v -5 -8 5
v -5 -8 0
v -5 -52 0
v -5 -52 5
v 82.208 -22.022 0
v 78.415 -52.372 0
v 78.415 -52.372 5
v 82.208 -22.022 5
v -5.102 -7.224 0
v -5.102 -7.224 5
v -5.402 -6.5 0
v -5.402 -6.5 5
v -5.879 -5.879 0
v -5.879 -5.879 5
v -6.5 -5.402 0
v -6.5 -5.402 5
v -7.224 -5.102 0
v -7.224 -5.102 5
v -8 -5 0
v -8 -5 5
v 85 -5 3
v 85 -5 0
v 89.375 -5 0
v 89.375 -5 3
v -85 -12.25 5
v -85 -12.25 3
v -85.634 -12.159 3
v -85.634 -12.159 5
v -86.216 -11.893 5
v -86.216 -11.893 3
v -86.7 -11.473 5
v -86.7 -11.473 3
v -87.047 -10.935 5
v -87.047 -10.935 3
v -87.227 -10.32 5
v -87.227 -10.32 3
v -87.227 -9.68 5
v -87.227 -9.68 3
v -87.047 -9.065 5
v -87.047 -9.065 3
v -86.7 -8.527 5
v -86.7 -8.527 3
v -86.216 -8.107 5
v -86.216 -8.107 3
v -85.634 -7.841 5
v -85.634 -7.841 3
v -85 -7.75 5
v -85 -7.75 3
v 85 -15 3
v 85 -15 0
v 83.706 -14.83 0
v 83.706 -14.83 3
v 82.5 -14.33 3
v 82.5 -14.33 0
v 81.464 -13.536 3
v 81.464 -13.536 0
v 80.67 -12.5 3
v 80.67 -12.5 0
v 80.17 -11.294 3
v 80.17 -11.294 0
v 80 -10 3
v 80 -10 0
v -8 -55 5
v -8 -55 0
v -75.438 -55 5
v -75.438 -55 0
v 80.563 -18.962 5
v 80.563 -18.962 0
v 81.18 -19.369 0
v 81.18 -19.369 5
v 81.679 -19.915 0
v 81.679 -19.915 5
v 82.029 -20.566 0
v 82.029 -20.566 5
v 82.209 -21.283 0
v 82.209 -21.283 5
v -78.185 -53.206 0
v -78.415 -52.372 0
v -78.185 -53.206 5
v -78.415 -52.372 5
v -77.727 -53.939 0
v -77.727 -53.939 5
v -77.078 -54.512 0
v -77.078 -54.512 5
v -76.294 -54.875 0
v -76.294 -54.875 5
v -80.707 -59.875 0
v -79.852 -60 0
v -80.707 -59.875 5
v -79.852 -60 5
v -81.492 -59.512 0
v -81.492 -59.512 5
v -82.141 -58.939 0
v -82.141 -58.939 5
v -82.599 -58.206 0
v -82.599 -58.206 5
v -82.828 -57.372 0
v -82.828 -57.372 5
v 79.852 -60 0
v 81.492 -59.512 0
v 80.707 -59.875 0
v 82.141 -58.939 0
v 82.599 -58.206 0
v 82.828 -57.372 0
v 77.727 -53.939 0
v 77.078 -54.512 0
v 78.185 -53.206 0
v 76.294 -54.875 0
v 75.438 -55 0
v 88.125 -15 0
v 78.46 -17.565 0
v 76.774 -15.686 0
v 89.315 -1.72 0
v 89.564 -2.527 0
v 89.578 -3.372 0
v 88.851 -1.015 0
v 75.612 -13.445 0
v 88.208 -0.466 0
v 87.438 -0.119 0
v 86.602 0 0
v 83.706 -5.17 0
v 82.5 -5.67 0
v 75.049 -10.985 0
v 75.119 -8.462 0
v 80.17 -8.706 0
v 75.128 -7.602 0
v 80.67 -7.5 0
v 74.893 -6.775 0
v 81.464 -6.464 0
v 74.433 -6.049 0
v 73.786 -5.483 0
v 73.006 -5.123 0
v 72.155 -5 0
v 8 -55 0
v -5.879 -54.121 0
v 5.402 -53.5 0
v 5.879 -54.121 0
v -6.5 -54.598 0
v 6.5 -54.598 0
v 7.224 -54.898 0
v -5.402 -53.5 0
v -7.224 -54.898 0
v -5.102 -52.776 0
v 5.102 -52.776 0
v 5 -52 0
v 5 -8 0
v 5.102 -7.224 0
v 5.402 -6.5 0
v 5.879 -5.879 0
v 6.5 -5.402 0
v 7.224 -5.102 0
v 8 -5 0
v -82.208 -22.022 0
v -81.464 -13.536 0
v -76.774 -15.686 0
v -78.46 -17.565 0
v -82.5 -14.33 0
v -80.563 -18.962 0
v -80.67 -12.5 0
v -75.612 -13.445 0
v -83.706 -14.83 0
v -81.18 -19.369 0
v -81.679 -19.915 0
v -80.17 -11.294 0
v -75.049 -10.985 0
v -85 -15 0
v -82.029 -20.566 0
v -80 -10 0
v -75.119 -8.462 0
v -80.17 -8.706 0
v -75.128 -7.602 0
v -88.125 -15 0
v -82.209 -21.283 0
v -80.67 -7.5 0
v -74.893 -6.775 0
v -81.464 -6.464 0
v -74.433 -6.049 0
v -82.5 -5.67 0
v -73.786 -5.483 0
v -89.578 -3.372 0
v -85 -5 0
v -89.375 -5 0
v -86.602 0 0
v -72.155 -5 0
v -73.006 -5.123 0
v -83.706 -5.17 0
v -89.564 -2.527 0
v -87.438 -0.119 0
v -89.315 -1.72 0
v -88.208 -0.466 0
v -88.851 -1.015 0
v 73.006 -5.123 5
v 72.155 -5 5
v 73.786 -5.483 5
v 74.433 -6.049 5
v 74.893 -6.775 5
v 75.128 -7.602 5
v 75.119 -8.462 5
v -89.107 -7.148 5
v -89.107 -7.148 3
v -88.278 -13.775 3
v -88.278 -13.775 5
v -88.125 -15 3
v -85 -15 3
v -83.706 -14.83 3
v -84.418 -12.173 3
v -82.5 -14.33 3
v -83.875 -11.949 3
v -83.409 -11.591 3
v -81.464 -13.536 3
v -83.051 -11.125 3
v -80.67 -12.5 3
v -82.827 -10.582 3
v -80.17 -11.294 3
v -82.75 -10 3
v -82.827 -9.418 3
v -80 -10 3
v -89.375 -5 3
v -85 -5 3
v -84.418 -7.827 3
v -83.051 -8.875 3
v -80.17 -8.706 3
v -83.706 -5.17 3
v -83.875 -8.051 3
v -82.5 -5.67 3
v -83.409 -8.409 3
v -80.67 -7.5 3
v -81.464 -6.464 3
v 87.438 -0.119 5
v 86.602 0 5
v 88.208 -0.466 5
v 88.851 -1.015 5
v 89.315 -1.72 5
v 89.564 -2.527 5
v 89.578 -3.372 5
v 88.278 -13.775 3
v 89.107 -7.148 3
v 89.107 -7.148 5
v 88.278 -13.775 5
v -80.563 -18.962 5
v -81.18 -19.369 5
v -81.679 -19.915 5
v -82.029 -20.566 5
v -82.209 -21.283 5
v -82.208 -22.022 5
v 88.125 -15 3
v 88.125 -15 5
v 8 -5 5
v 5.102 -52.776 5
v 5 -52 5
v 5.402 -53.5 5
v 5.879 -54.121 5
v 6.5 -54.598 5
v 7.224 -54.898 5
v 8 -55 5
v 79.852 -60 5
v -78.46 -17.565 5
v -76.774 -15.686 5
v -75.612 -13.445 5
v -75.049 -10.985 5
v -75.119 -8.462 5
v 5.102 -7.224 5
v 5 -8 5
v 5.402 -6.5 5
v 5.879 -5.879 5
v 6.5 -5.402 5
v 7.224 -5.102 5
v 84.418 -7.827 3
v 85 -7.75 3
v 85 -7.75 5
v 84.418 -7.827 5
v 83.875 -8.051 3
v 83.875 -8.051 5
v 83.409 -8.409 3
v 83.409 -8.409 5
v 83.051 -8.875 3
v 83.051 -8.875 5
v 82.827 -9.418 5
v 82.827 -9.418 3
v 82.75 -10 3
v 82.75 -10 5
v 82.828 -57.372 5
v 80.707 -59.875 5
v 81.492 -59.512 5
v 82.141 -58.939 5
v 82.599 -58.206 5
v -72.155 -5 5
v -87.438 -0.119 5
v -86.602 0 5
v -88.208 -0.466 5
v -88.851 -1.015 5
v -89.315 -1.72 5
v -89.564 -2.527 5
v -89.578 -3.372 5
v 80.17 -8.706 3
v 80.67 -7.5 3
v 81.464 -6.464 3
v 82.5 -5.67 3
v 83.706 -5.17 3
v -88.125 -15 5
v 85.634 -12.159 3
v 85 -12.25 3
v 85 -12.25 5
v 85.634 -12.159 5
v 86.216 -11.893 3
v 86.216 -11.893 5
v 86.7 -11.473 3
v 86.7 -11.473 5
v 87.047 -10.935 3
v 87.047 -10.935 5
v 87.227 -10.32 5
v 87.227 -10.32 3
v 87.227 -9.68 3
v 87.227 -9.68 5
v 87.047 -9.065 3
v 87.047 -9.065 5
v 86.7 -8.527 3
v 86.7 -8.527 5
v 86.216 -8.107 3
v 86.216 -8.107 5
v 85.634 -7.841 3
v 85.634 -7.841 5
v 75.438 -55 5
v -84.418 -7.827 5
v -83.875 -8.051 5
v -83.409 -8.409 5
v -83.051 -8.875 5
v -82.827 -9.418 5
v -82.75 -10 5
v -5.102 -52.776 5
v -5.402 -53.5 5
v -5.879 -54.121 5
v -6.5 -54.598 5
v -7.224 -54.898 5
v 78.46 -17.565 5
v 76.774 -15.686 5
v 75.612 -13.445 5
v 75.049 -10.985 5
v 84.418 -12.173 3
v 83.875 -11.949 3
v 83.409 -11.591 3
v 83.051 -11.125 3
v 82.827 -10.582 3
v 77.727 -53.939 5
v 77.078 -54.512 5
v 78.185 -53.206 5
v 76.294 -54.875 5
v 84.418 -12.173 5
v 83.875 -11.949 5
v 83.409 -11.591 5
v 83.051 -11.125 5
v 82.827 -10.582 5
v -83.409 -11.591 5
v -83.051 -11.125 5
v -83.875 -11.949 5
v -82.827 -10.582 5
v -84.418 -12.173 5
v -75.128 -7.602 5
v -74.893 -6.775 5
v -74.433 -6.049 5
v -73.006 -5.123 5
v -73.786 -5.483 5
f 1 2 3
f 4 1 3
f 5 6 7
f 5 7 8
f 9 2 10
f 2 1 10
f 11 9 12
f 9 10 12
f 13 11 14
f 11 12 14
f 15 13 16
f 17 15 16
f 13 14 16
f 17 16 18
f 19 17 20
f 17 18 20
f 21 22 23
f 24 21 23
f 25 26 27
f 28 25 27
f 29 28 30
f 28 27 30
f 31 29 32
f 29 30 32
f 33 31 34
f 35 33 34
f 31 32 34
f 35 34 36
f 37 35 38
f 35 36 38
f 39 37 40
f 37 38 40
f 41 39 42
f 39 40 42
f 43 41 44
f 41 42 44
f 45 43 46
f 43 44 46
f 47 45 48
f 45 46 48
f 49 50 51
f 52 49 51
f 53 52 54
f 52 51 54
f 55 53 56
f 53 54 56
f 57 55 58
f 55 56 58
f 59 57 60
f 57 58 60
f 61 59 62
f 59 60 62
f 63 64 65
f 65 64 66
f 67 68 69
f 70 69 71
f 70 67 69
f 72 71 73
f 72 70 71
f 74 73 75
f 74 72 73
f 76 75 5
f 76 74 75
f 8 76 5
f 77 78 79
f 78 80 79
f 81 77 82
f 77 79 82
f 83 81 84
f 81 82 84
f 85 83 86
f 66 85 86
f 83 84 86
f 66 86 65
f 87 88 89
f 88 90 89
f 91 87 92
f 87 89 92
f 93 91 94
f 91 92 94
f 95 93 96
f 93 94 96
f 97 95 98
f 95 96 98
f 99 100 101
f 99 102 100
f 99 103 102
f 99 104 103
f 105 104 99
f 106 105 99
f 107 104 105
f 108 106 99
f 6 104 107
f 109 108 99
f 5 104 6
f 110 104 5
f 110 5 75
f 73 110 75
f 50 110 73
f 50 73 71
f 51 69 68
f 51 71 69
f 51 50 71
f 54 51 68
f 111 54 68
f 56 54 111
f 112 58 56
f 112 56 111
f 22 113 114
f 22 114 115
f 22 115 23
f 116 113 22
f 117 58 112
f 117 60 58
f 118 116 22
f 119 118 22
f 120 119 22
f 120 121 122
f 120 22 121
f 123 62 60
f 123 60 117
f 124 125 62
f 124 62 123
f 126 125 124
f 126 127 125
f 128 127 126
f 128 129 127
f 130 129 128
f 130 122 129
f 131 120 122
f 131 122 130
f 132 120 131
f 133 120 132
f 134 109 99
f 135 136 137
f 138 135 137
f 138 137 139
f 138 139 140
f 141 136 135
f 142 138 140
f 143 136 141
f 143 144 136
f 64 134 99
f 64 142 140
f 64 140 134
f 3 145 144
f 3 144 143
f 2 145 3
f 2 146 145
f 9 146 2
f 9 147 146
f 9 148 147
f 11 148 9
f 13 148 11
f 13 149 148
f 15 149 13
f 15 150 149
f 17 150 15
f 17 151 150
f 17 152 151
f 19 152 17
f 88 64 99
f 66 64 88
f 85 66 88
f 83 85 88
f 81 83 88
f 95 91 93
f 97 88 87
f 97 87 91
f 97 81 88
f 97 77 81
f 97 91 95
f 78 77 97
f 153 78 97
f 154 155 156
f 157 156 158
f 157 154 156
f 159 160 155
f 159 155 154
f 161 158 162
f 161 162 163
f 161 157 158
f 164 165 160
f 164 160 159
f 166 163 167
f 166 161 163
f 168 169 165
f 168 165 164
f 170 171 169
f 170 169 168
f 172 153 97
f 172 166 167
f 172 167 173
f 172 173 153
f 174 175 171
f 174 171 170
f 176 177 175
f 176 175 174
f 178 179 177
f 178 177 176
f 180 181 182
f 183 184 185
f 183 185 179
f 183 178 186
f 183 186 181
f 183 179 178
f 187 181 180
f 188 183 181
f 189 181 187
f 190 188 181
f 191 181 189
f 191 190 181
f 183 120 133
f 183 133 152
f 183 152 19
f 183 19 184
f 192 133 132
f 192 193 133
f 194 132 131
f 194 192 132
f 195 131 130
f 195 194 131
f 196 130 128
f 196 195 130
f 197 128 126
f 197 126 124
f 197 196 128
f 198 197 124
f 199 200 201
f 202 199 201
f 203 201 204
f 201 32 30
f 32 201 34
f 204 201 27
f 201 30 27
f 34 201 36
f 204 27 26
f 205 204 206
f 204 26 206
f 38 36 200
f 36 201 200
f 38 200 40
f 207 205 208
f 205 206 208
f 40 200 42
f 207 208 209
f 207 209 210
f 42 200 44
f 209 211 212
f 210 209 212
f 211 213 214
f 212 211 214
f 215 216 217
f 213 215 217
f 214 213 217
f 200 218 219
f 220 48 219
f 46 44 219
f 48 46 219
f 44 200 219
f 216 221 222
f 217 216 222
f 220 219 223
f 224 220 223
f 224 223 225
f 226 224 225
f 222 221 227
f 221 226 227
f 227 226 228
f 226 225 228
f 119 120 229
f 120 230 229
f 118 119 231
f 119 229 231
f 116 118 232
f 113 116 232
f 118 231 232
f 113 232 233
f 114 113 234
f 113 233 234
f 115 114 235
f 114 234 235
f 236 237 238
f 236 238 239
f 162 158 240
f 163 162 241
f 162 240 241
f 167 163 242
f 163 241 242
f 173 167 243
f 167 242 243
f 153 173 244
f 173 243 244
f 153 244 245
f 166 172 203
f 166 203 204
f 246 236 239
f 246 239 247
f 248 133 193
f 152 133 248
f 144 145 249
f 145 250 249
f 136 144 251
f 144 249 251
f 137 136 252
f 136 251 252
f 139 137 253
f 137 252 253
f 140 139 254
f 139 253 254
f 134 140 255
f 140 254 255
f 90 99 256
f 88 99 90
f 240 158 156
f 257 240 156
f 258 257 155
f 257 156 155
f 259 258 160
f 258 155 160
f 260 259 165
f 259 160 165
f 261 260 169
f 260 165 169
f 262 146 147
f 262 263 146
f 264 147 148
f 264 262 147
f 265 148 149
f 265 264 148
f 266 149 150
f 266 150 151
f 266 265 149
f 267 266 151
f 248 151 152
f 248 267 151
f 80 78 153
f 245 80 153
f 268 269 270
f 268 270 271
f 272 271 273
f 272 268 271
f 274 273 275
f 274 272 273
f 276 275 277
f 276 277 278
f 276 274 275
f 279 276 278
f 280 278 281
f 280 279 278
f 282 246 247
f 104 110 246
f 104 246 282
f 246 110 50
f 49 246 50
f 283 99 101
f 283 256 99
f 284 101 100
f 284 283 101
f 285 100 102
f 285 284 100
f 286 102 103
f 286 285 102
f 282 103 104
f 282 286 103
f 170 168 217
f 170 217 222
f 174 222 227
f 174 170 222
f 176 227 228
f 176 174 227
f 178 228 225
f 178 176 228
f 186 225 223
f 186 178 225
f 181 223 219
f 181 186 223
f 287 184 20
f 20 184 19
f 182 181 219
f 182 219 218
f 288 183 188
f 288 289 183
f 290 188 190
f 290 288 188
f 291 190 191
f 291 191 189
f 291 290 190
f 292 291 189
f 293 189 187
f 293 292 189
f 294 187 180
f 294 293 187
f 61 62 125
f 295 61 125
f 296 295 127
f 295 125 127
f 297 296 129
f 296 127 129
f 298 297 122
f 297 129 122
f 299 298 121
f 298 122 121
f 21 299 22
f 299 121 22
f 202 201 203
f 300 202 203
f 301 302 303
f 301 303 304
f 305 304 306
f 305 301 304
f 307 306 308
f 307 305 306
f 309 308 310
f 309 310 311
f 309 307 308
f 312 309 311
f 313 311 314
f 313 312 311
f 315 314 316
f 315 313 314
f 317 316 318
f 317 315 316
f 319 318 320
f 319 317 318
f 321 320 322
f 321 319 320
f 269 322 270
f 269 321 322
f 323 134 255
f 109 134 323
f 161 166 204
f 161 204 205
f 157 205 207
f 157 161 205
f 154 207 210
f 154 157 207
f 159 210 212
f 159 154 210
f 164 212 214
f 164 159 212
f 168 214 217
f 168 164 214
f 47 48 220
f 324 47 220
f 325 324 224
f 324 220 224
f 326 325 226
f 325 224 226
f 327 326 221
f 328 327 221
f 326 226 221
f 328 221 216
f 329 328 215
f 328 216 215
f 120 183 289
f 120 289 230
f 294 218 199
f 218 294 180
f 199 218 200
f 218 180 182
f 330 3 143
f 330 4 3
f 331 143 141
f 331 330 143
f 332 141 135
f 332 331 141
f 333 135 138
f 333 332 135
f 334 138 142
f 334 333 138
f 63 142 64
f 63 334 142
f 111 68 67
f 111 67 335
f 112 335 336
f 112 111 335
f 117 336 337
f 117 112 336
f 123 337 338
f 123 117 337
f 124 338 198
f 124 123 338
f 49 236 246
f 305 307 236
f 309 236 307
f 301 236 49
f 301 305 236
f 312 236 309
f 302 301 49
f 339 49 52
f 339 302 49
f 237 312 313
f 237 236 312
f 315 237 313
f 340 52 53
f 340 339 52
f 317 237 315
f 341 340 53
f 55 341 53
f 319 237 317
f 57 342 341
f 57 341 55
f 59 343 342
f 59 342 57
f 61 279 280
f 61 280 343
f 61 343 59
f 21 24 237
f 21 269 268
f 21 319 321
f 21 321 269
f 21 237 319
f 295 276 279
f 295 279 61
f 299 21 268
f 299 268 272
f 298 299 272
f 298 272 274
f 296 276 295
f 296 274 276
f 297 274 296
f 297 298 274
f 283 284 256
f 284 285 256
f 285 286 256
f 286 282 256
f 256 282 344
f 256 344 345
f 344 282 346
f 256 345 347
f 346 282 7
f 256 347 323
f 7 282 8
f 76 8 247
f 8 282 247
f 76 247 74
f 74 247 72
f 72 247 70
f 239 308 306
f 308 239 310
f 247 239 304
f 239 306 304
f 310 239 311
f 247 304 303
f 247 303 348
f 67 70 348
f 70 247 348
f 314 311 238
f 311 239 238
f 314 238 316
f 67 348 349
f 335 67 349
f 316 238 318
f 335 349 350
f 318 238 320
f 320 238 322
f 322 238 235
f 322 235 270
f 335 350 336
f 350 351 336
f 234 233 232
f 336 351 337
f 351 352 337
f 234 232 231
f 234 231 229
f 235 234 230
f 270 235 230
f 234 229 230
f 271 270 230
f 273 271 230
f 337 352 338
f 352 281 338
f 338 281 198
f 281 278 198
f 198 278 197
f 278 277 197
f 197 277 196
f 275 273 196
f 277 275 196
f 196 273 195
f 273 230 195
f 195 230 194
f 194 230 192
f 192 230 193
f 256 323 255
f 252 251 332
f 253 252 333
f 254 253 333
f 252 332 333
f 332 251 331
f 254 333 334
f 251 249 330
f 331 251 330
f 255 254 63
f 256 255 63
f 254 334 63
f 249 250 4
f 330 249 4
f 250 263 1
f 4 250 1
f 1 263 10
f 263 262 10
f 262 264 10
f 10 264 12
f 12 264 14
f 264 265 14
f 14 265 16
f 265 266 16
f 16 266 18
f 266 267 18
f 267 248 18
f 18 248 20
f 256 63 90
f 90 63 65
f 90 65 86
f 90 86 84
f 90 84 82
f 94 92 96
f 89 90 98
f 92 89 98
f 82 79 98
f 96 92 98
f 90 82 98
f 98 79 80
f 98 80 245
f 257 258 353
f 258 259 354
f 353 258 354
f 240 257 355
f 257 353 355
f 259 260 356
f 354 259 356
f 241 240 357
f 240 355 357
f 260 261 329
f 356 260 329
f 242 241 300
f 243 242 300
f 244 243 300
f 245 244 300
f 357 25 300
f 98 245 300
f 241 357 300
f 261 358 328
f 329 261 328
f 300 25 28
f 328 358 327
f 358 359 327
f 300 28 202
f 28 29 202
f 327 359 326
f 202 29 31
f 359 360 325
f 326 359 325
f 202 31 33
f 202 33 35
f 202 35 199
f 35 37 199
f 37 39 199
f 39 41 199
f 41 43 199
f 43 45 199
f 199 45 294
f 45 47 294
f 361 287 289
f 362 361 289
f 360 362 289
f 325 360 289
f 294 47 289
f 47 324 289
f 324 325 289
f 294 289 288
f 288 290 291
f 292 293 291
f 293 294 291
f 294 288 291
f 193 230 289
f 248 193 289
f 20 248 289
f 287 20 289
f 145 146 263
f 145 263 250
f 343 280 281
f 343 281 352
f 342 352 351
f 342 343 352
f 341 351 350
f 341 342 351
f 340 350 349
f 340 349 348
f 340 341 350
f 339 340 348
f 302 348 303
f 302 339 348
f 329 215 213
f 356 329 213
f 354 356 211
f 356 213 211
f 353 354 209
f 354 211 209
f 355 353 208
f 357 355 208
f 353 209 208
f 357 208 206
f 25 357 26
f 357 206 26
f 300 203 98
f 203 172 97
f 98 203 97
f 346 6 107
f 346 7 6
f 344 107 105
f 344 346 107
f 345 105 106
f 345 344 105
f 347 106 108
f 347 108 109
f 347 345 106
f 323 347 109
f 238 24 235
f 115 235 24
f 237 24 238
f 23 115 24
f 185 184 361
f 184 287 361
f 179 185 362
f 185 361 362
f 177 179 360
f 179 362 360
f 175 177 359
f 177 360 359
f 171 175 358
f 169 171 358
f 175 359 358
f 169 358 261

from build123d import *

# Parameters (mm, degrees)
SZKIC1_R                    = 2.25
DODANIE_WYCI_GNI_CIE1_DEPTH = 5
WYTNIJ_WYCI_GNI_CIE1_DEPTH  = 3
ZAOKR_GLENIE3_R             = 3
WYTNIJ_WYCI_GNI_CIE3_DEPTH  = 108.951175455
ZAOKR_GLENIE4_R             = 3


with BuildPart() as part:
    # Szkic1 → Dodanie-wyciągnięcie1 (new body)
    with BuildSketch(Plane.XY):
        Polygon((0, 0), (-90, 0), (-82.5, -60), (0, -60), align=None)
        with Locations((-85, -10)):
            Circle(SZKIC1_R, mode=Mode.SUBTRACT)
    extrude(amount=DODANIE_WYCI_GNI_CIE1_DEPTH)

    # Szkic1<3> → Wytnij-wyciągnięcie1 (cut)
    with BuildSketch(Plane.XY):
        with BuildLine():
            Line((-85, -5), (-89.375, -5))
            Line((-89.375, -5), (-89.106551139, -7.147590888))
            ThreePointArc((-89.106551139, -7.147590888), (-89.961389384, -10.620173673), (-88.278064246, -13.775486035))
            Line((-88.278064246, -13.775486035), (-88.125, -15))
            Line((-88.125, -15), (-85, -15))
            ThreePointArc((-85, -15), (-80, -10), (-85, -5))
        make_face()
    extrude(amount=WYTNIJ_WYCI_GNI_CIE1_DEPTH, mode=Mode.SUBTRACT)

    # Zaokrąglenie3
    zaokr_glenie3_edges = [part.edges().sort_by_distance(p)[0] for p in [
        (-82.5, -60, 2.5),
        (-90, 0, 2.5),
    ]]
    fillet(zaokr_glenie3_edges, radius=ZAOKR_GLENIE3_R)

    # Szkic5 → Wytnij-wyciągnięcie3 (cut, through all)
    with BuildSketch(Plane(origin=(0, 0, 0), x_dir=(-1, 0, 0), z_dir=(0, 0, -1))):
        with BuildLine():
            Line((5, -55), (78.086088907, -55))
            Line((78.086088907, -55), (82.500757178, -19.682653836))
            ThreePointArc((82.500757178, -19.682653836), (75.778900637, -13.869279847), (76.339745962, -5))
            Line((76.339745962, -5), (5, -5))
            Line((5, -5), (5, -55))
        make_face()
    extrude(amount=-WYTNIJ_WYCI_GNI_CIE3_DEPTH, mode=Mode.SUBTRACT)

    # Zaokrąglenie4
    zaokr_glenie4_edges = [part.edges().sort_by_distance(p)[0] for p in [
        (-5, -5, 2.5),
        (-5, -55, 2.5),
        (-78.086088907, -55, 2.5),
        (-82.500757178, -19.682653836, 2.5),
        (-76.339745962, -5, 2.5),
    ]]
    fillet(zaokr_glenie4_edges, radius=ZAOKR_GLENIE4_R)

    # Lustro5: part across plane


with BuildPart() as part_1:
    add(part.part)
    add(part.part.mirror(Plane(origin=(0, 0, 0), x_dir=(0, 0, 1), z_dir=(1, 0, 0))))


solid = part_1.part
